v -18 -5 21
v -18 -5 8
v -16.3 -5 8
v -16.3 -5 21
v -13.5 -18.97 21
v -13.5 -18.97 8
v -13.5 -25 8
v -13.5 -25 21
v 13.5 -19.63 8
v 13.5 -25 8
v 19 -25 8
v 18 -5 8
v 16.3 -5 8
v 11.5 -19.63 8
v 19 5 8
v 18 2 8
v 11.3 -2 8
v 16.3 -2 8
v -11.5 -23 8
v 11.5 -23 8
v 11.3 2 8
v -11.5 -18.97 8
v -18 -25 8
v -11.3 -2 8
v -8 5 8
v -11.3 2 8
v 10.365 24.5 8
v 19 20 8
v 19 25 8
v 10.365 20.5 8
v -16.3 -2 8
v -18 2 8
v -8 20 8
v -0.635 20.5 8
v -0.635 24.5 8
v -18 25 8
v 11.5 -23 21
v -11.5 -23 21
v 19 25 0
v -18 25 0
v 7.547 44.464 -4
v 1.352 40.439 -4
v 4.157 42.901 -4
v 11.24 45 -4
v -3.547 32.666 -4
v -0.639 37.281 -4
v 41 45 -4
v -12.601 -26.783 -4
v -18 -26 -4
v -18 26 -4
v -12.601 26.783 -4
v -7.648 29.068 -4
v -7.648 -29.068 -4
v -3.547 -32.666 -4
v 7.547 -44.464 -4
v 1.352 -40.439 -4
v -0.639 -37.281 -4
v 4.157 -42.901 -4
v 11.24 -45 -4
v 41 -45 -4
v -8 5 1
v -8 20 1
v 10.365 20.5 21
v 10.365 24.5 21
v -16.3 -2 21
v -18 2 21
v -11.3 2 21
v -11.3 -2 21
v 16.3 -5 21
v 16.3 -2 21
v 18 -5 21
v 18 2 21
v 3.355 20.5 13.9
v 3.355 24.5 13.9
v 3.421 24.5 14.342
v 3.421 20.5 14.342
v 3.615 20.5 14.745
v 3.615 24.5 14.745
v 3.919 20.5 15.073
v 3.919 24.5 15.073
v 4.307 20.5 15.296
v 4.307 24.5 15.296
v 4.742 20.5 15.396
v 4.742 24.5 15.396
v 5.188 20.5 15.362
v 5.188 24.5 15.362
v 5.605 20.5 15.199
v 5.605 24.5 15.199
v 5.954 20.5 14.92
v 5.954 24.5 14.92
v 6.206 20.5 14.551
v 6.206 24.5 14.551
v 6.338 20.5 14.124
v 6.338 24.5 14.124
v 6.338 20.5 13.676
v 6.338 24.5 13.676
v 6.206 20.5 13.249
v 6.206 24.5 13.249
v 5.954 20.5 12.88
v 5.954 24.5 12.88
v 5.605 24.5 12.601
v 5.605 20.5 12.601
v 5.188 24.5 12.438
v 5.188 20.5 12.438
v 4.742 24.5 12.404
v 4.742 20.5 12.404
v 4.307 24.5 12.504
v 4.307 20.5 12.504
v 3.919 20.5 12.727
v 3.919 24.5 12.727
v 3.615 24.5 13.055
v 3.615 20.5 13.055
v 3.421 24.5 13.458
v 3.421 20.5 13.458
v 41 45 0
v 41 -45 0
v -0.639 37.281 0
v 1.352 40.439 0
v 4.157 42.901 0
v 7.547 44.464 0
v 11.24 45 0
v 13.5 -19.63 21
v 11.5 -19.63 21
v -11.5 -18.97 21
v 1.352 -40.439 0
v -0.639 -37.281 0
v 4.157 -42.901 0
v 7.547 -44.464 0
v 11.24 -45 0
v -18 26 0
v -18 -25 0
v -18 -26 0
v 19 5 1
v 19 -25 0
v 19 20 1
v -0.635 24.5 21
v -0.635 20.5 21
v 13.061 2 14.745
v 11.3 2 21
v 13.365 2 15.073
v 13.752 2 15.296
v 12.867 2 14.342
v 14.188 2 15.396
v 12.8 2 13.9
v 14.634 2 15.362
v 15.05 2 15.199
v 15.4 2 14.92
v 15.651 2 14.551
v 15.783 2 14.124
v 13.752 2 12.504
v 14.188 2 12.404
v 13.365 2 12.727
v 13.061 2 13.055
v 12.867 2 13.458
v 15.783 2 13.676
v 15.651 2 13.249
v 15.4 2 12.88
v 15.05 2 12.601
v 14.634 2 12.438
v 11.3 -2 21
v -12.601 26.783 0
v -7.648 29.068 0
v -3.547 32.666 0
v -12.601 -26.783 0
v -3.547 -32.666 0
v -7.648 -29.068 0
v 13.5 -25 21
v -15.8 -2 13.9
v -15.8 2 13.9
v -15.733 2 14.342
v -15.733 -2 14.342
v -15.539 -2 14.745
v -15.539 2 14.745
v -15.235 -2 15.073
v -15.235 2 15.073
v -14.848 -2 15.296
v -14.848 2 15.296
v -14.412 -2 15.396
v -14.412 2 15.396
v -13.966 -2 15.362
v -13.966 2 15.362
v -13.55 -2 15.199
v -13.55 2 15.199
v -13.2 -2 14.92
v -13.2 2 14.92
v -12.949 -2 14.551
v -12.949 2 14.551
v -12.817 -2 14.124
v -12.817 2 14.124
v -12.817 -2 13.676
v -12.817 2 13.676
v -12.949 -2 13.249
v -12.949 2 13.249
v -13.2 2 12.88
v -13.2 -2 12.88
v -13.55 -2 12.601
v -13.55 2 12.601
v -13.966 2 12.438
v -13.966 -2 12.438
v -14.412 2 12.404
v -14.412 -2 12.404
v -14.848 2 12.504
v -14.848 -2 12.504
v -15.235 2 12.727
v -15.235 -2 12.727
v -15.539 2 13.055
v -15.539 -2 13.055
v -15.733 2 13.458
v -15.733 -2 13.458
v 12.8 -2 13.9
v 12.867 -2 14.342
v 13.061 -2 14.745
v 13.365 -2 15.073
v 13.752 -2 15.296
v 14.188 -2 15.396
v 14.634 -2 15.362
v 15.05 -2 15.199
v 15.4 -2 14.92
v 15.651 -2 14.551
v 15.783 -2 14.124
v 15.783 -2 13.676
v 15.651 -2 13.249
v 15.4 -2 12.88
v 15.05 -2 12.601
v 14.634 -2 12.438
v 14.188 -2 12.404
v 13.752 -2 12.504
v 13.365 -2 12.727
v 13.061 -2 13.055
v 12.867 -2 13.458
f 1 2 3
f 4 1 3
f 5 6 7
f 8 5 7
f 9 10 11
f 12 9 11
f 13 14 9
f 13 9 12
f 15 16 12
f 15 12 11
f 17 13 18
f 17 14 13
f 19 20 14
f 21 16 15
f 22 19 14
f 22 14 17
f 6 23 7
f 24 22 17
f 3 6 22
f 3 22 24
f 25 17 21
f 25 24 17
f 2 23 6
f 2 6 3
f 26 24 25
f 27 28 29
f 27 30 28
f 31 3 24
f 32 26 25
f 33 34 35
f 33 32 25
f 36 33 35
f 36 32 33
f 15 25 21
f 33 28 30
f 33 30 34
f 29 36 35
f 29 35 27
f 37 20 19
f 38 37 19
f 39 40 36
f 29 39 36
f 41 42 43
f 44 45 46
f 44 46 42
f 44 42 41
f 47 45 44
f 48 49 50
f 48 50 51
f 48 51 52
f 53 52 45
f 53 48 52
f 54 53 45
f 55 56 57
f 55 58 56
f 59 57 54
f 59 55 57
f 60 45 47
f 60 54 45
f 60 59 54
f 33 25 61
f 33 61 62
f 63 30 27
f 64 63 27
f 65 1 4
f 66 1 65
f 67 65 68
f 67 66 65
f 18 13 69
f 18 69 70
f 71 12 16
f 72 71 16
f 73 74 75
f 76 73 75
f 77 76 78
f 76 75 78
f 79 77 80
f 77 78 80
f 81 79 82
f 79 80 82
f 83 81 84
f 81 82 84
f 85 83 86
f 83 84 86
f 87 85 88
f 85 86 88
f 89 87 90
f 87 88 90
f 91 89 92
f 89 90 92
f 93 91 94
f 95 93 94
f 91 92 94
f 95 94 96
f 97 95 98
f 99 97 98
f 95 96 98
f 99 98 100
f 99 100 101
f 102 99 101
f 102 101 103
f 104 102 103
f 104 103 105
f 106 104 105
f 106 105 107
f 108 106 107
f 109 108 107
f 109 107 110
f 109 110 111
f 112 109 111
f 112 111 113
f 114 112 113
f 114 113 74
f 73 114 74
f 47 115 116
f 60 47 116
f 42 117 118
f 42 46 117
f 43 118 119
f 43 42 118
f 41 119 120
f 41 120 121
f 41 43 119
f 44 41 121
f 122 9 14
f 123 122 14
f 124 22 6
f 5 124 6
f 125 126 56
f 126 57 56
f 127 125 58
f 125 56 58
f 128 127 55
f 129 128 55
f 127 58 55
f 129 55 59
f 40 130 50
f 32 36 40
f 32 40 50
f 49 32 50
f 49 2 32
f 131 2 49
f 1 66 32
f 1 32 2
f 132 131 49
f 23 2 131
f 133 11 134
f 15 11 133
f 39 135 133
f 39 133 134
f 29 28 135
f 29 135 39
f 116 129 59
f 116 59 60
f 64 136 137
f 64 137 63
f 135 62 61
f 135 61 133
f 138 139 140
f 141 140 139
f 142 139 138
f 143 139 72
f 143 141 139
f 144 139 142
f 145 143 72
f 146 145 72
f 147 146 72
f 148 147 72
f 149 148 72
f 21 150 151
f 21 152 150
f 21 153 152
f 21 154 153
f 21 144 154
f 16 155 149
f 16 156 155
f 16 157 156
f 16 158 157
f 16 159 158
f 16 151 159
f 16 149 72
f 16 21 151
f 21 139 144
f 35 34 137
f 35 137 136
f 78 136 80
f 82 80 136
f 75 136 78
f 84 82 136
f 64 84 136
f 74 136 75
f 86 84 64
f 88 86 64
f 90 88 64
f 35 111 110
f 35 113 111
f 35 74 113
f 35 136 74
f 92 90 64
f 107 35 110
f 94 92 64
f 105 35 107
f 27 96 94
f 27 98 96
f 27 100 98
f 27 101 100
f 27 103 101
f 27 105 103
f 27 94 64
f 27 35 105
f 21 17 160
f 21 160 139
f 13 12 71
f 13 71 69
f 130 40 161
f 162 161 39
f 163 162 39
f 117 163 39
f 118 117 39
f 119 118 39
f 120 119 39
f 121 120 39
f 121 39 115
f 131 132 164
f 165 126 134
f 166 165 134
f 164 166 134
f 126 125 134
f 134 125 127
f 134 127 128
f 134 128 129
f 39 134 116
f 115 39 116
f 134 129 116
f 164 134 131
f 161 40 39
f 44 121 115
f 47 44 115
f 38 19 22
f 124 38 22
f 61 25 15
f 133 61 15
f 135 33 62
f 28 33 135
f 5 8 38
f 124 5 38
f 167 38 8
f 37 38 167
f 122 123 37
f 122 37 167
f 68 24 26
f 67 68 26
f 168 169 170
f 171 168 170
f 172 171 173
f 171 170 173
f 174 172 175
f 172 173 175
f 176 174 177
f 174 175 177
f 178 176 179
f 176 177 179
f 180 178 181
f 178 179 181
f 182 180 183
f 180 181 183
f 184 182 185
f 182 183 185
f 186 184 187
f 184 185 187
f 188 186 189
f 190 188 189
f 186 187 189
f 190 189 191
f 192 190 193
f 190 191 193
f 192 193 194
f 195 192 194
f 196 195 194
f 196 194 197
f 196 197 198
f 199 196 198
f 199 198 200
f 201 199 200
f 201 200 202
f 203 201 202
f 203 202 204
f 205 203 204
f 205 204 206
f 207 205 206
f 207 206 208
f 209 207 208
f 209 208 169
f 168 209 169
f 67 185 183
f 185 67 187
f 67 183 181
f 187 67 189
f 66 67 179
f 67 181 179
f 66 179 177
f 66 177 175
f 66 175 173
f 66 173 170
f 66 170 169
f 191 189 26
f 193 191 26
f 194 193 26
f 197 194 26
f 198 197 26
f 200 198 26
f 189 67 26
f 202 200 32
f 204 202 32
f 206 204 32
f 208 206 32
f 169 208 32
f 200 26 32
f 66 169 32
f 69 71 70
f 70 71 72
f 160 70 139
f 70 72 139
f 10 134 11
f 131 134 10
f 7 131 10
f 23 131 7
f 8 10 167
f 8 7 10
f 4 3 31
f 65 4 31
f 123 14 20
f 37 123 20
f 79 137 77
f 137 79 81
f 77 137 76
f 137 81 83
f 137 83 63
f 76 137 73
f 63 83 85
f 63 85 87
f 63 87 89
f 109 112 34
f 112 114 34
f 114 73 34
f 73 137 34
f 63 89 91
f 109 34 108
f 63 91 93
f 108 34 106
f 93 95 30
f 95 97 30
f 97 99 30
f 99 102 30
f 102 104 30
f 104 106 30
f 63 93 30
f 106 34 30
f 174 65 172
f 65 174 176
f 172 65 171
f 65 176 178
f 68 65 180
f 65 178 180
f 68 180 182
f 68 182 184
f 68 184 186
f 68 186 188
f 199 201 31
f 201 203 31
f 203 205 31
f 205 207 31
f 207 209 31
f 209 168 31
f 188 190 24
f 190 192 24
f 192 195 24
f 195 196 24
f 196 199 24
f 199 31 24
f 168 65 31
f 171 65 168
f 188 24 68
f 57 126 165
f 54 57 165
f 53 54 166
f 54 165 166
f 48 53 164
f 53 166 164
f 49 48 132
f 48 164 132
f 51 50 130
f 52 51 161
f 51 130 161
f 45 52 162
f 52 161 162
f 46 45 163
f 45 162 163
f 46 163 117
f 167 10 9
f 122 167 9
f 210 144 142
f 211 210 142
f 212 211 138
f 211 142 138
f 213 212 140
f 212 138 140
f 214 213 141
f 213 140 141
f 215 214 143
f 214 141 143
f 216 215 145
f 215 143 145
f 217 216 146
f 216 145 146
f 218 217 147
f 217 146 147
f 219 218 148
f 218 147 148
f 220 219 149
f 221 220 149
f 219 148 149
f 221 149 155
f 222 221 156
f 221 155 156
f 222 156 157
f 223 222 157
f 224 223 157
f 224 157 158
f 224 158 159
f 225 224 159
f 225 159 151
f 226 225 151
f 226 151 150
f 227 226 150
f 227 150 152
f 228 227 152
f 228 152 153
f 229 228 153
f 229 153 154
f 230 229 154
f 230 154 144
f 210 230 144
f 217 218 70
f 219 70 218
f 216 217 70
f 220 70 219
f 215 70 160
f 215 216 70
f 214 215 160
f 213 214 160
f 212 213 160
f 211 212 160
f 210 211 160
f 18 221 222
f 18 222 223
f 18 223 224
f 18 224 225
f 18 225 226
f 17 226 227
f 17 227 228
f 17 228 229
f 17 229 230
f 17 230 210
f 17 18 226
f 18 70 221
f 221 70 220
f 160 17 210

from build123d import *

# Parameters (mm, degrees)
SKETCH_W        = 36
SKETCH_H        = 50
PAD_DEPTH       = 8
PAD001_DEPTH    = 13
SKETCH004_W     = 11
SKETCH004_H     = 4
PAD003_DEPTH    = 13
PAD002_DEPTH    = 13
SKETCH005_W     = 25.977524
SKETCH005_H     = 13
POCKET_DEPTH    = 5
SKETCH006_R     = 1.5
POCKET001_DEPTH = 5
SKETCH007_R     = 1.5
POCKET002_DEPTH = 5
CHAMFER_SIZE    = 2
CHAMFER001_SIZE = 2
CHAMFER002_SIZE = 3
CHAMFER003_SIZE = 2
SKETCH008_W     = 23.210894
SKETCH008_H     = 13
POCKET003_DEPTH = 2
CHAMFER004_SIZE = 1
SKETCH009_W     = 50
SKETCH009_H     = 8
PAD004_DEPTH    = 50
SKETCH010_W     = 50
SKETCH010_H     = 15
POCKET004_DEPTH = 7
SKETCH011_W     = 52.452881
SKETCH011_H     = 55.220252
POCKET005_DEPTH = 8
SKETCH012_W     = 59
SKETCH012_H     = 90
PAD005_DEPTH    = 4
SKETCH013_R     = 19
POCKET006_DEPTH = 4.001
FILLET_R        = 13


with BuildPart() as pad003:
    # Sketch → Pad (new body)
    with BuildSketch(Plane.XY):
        Rectangle(SKETCH_W, SKETCH_H)
    extrude(amount=PAD_DEPTH)

    # Sketch002 → Pad001 (new body)
    with BuildSketch(Plane.XY.offset(8)):
        Polygon((-13.5, -25), (13.5, -25), (13.5, -19.629501), (11.5, -19.629501), (11.5, -23), (-11.5, -23), (-11.5, -18.969727), (-13.5, -18.969727), align=None)
    extrude(amount=PAD001_DEPTH)

    # Sketch004 → Pad003 (new body)
    with BuildSketch(Plane.XY.offset(8)):
        with Locations((4.8652, 22.5)):
            Rectangle(SKETCH004_W, SKETCH004_H)
    extrude(amount=PAD003_DEPTH)


with BuildPart() as fillet_body:
    # Sketch003 → Pad002 (new body)
    with BuildSketch(Plane.XY.offset(8)):
        Polygon((11.3, 2), (18, 2), (18, -5), (16.3, -5), (16.3, -2), (11.3, -2), align=None)
        Polygon((-11.3, 2), (-18, 2), (-18, -5), (-16.3, -5), (-16.3, -2), (-11.3, -2), align=None)
    extrude(amount=PAD002_DEPTH)

    # Fusion: union Pad003
    add(pad003.part)

    # Sketch005 → Pocket (cut)
    with BuildSketch(Plane.XY.offset(8)):
        with Locations((5.011238, 13.5)):
            Rectangle(SKETCH005_W, SKETCH005_H)
    extrude(amount=-POCKET_DEPTH, mode=Mode.SUBTRACT)

    # Sketch006 → Pocket001 (cut)
    with BuildSketch(Plane(origin=(0, 2, 0), x_dir=(-1, 0, 0), z_dir=(0, 1, 0))):
        with Locations((-14.3, 13.9)):
            Circle(SKETCH006_R)
        with Locations((14.3, 13.9)):
            Circle(SKETCH006_R)
    extrude(amount=-POCKET001_DEPTH, mode=Mode.SUBTRACT)

    # Sketch007 → Pocket002 (cut)
    with BuildSketch(Plane(origin=(0, 24.5, 0), x_dir=(-1, 0, 0), z_dir=(0, 1, 0))):
        with Locations((-4.854515, 13.9)):
            Circle(SKETCH007_R)
    extrude(amount=-POCKET002_DEPTH, mode=Mode.SUBTRACT)

    # Chamfer
    chamfer_edges = [fillet_body.edges().sort_by_distance(p)[0] for p in [
        (18, 13.5, 3),
    ]]
    chamfer(chamfer_edges, length=CHAMFER_SIZE)

    # Chamfer001
    chamfer001_edges = [fillet_body.edges().sort_by_distance(p)[0] for p in [
        (16, 13.5, 3),
    ]]
    chamfer(chamfer001_edges, length=CHAMFER001_SIZE)

    # Chamfer002
    chamfer002_edges = [fillet_body.edges().sort_by_distance(p)[0] for p in [
        (14, 13.5, 3),
    ]]
    chamfer(chamfer002_edges, length=CHAMFER002_SIZE)

    # Chamfer003
    chamfer003_edges = [fillet_body.edges().sort_by_distance(p)[0] for p in [
        (11, 13.5, 3),
    ]]
    chamfer(chamfer003_edges, length=CHAMFER003_SIZE)

    # Sketch008 → Pocket003 (cut)
    with BuildSketch(Plane.XY.offset(3)):
        with Locations((7.17125, 13.5)):
            Rectangle(SKETCH008_W, SKETCH008_H)
    extrude(amount=-POCKET003_DEPTH, mode=Mode.SUBTRACT)

    # Chamfer004
    chamfer004_edges = [fillet_body.edges().sort_by_distance(p)[0] for p in [
        (-4.434197, 13.5, 3),
    ]]
    chamfer(chamfer004_edges, length=CHAMFER004_SIZE)

    # Sketch009 → Pad004 (new body)
    with BuildSketch(Plane.YZ.offset(18)):
        with Locations((0, 4)):
            Rectangle(SKETCH009_W, SKETCH009_H)
    extrude(amount=PAD004_DEPTH)

    # Sketch010 → Pocket004 (cut)
    with BuildSketch(Plane.XY.offset(8)):
        with Locations((17, 12.5)):
            Rectangle(SKETCH010_W, SKETCH010_H)
    extrude(amount=-POCKET004_DEPTH, mode=Mode.SUBTRACT)

    # Sketch011 → Pocket005 (cut)
    with BuildSketch(Plane.XY.offset(8)):
        with Locations((45.22644, 0)):
            Rectangle(SKETCH011_W, SKETCH011_H)
    extrude(amount=-POCKET005_DEPTH, mode=Mode.SUBTRACT)

    # Sketch012 → Pad005 (new body)
    with BuildSketch(Plane(origin=(0, 0, 0), x_dir=(1, 0, 0), z_dir=(0, 0, -1))):
        with Locations((11.5, 0)):
            Rectangle(SKETCH012_W, SKETCH012_H)
    extrude(amount=PAD005_DEPTH)

    # Sketch013 → Pocket006 (cut, through all)
    with BuildSketch(Plane.XY):
        with Locations((-18, 45)):
            Circle(SKETCH013_R)
        with Locations((-18, -45)):
            Circle(SKETCH013_R)
    extrude(amount=-POCKET006_DEPTH, mode=Mode.SUBTRACT)

    # Fillet
    fillet_edges = [fillet_body.edges().sort_by_distance(p)[0] for p in [
        (1, -45, -2),
        (1, 45, -2),
    ]]
    fillet(fillet_edges, radius=FILLET_R)


solid = fillet_body.part
